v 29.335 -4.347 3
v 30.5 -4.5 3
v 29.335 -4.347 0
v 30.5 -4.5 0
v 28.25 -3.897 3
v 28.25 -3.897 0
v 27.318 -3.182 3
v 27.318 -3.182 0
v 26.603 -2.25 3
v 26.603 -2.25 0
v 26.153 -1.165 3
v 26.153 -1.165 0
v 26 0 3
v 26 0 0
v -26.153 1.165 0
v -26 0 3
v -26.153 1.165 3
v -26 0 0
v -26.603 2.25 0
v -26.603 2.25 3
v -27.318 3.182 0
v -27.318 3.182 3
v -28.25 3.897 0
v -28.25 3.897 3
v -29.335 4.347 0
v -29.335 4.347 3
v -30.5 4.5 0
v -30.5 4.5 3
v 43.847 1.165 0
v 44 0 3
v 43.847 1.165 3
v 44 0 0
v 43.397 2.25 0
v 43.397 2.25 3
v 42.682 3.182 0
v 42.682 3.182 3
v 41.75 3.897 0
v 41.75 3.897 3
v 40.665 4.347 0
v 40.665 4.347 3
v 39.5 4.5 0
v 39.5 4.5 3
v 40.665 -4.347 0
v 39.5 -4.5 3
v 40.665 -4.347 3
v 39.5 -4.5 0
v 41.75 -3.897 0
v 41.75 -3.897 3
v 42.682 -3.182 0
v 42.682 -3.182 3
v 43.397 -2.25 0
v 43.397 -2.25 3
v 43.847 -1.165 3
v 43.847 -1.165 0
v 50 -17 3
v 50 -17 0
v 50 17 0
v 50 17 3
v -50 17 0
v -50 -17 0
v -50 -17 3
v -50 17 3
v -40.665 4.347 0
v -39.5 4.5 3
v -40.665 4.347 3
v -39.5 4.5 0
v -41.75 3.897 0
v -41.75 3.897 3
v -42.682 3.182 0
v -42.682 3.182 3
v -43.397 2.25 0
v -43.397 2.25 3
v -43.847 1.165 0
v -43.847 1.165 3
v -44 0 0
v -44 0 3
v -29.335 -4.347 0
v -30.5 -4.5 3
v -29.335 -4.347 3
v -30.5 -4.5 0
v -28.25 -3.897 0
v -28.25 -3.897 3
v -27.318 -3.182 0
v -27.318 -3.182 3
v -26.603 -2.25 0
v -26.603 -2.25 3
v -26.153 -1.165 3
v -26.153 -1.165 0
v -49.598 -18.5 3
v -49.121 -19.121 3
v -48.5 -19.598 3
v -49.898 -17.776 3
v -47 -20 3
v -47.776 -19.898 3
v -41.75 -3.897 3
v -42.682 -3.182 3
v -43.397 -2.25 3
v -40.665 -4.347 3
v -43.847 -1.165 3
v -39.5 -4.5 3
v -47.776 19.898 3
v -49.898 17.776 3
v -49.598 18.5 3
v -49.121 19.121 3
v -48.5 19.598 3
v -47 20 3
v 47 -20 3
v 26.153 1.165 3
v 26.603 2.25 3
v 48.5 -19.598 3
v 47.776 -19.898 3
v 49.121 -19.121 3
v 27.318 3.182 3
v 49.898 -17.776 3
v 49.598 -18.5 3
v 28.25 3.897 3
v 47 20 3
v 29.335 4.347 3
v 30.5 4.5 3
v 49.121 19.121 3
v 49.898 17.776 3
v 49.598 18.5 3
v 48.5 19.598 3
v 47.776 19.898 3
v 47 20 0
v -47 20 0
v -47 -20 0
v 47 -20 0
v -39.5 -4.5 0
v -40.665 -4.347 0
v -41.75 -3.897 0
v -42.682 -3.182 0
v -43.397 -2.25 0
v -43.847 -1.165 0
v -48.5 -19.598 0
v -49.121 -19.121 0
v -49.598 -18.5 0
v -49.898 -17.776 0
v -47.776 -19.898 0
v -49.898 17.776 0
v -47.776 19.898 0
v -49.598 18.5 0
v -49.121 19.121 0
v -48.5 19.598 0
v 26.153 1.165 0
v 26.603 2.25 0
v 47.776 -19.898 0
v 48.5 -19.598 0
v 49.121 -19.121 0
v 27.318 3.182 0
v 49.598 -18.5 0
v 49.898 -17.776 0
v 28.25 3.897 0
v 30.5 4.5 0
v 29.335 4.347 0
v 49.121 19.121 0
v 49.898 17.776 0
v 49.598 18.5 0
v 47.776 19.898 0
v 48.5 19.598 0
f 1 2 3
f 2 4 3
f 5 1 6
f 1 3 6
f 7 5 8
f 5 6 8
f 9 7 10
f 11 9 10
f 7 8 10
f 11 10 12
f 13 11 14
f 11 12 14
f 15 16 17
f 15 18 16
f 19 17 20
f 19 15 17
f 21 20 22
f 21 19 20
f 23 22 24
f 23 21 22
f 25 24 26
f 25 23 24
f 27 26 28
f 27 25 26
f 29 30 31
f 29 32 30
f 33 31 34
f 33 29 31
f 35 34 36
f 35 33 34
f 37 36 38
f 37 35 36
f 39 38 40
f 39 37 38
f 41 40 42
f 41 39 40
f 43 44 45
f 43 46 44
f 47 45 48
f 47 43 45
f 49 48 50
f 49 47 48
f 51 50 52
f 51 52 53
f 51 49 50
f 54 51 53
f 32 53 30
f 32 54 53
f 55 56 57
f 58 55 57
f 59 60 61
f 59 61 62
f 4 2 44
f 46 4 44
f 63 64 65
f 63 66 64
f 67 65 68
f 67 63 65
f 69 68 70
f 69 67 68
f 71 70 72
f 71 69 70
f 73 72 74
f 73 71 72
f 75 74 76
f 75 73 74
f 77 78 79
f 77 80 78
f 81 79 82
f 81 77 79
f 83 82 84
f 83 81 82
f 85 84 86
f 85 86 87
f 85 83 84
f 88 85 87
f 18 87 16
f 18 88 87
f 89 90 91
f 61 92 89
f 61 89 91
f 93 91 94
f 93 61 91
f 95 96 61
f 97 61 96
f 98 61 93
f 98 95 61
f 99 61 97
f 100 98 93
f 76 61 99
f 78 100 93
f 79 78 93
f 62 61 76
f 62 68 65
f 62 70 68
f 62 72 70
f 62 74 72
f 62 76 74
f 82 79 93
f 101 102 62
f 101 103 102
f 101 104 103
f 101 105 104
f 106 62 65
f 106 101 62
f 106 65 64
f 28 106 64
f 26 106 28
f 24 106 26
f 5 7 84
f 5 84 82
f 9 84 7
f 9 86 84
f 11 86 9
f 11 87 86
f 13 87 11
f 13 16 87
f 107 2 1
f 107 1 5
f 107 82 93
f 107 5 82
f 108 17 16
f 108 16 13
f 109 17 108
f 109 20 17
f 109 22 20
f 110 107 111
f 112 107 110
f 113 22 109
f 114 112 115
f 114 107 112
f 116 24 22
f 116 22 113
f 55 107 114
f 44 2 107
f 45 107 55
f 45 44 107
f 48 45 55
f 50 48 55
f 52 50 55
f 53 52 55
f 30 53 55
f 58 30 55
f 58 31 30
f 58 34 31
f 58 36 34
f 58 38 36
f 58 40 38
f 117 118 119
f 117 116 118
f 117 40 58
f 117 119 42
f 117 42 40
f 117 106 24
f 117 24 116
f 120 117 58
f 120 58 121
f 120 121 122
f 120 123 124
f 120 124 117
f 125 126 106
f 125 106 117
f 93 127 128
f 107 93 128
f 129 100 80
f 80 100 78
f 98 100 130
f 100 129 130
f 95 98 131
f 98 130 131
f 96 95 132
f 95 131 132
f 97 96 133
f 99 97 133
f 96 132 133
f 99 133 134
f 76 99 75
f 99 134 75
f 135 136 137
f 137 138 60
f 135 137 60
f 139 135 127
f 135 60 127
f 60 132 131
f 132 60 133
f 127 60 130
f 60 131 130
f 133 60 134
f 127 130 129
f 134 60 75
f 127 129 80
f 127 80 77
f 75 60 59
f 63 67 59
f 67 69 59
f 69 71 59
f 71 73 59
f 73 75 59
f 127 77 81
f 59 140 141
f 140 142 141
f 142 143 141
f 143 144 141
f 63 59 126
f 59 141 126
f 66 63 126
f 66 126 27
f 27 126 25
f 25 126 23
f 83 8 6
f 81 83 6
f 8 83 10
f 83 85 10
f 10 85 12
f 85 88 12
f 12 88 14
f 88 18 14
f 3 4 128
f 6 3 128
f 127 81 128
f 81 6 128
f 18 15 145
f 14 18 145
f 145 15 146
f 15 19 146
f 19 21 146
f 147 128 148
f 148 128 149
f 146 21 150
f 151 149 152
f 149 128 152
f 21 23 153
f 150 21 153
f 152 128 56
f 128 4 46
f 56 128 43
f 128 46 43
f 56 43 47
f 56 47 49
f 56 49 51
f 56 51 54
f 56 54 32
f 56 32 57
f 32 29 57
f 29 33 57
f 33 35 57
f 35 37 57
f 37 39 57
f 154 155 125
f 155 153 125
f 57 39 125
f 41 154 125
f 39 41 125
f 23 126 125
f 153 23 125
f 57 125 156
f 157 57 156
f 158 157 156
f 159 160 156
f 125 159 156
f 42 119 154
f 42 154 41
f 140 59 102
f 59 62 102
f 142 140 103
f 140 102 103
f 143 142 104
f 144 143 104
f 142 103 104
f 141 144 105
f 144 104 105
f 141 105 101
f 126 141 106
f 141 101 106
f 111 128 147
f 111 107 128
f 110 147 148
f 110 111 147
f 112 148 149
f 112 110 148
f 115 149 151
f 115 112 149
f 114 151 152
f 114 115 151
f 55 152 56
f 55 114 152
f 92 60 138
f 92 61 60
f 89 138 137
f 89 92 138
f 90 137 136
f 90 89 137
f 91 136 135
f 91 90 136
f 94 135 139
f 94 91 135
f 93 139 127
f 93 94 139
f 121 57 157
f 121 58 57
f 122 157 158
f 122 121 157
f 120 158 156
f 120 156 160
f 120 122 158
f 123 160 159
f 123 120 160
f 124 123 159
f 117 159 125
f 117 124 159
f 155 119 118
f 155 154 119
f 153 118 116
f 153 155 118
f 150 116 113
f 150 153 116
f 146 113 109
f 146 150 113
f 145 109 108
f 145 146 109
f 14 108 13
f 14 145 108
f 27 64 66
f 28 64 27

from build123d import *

# Parameters (mm, degrees)
F0_W     = 100
F0_H     = 40
F1_DEPTH = 3
F2_R     = 3
F3_W     = 18
F3_H     = 9
F4_DEPTH = 25
F5_R     = 4.49999
F6_R     = 4.49999


# Not quite as in the source:
# - a fillet or chamfer is up to 0.001 mm smaller than in the source, because OpenCascade refuses the exact size


with BuildPart() as f1:
    # F0 (on Top) → F1 (new body)
    with BuildSketch(Plane.XY):
        Rectangle(F0_W, F0_H)
    extrude(amount=F1_DEPTH)

    # F2
    f2_edges = [f1.edges().sort_by_distance(p)[0] for p in [
        (50, -20, 1.5),
        (50, 20, 1.5),
        (-50, -20, 1.5),
        (-50, 20, 1.5),
    ]]
    fillet(f2_edges, radius=F2_R)

    # F3 (on face) → F4 (cut)
    with BuildSketch(Plane.XY.offset(3)):
        with Locations((-35, 0)):
            Rectangle(F3_W, F3_H)
        with Locations((35, 0)):
            Rectangle(F3_W, F3_H)
    extrude(amount=-F4_DEPTH, mode=Mode.SUBTRACT)

    # F5 (radius 4.5 in the source; OpenCascade refuses exactly that, so slightly less here)
    f5_edges = [f1.edges().sort_by_distance(p)[0] for p in [
        (-44, 4.5, 1.5),
        (-26, 4.5, 1.5),
        (-26, -4.5, 1.5),
        (-44, -4.5, 1.5),
    ]]
    fillet(f5_edges, radius=F5_R)

    # F6 (radius 4.5 in the source; OpenCascade refuses exactly that, so slightly less here)
    f6_edges = [f1.edges().sort_by_distance(p)[0] for p in [
        (26, 4.5, 1.5),
        (44, 4.5, 1.5),
        (44, -4.5, 1.5),
        (26, -4.5, 1.5),
    ]]
    fillet(f6_edges, radius=F6_R)


solid = f1.part
